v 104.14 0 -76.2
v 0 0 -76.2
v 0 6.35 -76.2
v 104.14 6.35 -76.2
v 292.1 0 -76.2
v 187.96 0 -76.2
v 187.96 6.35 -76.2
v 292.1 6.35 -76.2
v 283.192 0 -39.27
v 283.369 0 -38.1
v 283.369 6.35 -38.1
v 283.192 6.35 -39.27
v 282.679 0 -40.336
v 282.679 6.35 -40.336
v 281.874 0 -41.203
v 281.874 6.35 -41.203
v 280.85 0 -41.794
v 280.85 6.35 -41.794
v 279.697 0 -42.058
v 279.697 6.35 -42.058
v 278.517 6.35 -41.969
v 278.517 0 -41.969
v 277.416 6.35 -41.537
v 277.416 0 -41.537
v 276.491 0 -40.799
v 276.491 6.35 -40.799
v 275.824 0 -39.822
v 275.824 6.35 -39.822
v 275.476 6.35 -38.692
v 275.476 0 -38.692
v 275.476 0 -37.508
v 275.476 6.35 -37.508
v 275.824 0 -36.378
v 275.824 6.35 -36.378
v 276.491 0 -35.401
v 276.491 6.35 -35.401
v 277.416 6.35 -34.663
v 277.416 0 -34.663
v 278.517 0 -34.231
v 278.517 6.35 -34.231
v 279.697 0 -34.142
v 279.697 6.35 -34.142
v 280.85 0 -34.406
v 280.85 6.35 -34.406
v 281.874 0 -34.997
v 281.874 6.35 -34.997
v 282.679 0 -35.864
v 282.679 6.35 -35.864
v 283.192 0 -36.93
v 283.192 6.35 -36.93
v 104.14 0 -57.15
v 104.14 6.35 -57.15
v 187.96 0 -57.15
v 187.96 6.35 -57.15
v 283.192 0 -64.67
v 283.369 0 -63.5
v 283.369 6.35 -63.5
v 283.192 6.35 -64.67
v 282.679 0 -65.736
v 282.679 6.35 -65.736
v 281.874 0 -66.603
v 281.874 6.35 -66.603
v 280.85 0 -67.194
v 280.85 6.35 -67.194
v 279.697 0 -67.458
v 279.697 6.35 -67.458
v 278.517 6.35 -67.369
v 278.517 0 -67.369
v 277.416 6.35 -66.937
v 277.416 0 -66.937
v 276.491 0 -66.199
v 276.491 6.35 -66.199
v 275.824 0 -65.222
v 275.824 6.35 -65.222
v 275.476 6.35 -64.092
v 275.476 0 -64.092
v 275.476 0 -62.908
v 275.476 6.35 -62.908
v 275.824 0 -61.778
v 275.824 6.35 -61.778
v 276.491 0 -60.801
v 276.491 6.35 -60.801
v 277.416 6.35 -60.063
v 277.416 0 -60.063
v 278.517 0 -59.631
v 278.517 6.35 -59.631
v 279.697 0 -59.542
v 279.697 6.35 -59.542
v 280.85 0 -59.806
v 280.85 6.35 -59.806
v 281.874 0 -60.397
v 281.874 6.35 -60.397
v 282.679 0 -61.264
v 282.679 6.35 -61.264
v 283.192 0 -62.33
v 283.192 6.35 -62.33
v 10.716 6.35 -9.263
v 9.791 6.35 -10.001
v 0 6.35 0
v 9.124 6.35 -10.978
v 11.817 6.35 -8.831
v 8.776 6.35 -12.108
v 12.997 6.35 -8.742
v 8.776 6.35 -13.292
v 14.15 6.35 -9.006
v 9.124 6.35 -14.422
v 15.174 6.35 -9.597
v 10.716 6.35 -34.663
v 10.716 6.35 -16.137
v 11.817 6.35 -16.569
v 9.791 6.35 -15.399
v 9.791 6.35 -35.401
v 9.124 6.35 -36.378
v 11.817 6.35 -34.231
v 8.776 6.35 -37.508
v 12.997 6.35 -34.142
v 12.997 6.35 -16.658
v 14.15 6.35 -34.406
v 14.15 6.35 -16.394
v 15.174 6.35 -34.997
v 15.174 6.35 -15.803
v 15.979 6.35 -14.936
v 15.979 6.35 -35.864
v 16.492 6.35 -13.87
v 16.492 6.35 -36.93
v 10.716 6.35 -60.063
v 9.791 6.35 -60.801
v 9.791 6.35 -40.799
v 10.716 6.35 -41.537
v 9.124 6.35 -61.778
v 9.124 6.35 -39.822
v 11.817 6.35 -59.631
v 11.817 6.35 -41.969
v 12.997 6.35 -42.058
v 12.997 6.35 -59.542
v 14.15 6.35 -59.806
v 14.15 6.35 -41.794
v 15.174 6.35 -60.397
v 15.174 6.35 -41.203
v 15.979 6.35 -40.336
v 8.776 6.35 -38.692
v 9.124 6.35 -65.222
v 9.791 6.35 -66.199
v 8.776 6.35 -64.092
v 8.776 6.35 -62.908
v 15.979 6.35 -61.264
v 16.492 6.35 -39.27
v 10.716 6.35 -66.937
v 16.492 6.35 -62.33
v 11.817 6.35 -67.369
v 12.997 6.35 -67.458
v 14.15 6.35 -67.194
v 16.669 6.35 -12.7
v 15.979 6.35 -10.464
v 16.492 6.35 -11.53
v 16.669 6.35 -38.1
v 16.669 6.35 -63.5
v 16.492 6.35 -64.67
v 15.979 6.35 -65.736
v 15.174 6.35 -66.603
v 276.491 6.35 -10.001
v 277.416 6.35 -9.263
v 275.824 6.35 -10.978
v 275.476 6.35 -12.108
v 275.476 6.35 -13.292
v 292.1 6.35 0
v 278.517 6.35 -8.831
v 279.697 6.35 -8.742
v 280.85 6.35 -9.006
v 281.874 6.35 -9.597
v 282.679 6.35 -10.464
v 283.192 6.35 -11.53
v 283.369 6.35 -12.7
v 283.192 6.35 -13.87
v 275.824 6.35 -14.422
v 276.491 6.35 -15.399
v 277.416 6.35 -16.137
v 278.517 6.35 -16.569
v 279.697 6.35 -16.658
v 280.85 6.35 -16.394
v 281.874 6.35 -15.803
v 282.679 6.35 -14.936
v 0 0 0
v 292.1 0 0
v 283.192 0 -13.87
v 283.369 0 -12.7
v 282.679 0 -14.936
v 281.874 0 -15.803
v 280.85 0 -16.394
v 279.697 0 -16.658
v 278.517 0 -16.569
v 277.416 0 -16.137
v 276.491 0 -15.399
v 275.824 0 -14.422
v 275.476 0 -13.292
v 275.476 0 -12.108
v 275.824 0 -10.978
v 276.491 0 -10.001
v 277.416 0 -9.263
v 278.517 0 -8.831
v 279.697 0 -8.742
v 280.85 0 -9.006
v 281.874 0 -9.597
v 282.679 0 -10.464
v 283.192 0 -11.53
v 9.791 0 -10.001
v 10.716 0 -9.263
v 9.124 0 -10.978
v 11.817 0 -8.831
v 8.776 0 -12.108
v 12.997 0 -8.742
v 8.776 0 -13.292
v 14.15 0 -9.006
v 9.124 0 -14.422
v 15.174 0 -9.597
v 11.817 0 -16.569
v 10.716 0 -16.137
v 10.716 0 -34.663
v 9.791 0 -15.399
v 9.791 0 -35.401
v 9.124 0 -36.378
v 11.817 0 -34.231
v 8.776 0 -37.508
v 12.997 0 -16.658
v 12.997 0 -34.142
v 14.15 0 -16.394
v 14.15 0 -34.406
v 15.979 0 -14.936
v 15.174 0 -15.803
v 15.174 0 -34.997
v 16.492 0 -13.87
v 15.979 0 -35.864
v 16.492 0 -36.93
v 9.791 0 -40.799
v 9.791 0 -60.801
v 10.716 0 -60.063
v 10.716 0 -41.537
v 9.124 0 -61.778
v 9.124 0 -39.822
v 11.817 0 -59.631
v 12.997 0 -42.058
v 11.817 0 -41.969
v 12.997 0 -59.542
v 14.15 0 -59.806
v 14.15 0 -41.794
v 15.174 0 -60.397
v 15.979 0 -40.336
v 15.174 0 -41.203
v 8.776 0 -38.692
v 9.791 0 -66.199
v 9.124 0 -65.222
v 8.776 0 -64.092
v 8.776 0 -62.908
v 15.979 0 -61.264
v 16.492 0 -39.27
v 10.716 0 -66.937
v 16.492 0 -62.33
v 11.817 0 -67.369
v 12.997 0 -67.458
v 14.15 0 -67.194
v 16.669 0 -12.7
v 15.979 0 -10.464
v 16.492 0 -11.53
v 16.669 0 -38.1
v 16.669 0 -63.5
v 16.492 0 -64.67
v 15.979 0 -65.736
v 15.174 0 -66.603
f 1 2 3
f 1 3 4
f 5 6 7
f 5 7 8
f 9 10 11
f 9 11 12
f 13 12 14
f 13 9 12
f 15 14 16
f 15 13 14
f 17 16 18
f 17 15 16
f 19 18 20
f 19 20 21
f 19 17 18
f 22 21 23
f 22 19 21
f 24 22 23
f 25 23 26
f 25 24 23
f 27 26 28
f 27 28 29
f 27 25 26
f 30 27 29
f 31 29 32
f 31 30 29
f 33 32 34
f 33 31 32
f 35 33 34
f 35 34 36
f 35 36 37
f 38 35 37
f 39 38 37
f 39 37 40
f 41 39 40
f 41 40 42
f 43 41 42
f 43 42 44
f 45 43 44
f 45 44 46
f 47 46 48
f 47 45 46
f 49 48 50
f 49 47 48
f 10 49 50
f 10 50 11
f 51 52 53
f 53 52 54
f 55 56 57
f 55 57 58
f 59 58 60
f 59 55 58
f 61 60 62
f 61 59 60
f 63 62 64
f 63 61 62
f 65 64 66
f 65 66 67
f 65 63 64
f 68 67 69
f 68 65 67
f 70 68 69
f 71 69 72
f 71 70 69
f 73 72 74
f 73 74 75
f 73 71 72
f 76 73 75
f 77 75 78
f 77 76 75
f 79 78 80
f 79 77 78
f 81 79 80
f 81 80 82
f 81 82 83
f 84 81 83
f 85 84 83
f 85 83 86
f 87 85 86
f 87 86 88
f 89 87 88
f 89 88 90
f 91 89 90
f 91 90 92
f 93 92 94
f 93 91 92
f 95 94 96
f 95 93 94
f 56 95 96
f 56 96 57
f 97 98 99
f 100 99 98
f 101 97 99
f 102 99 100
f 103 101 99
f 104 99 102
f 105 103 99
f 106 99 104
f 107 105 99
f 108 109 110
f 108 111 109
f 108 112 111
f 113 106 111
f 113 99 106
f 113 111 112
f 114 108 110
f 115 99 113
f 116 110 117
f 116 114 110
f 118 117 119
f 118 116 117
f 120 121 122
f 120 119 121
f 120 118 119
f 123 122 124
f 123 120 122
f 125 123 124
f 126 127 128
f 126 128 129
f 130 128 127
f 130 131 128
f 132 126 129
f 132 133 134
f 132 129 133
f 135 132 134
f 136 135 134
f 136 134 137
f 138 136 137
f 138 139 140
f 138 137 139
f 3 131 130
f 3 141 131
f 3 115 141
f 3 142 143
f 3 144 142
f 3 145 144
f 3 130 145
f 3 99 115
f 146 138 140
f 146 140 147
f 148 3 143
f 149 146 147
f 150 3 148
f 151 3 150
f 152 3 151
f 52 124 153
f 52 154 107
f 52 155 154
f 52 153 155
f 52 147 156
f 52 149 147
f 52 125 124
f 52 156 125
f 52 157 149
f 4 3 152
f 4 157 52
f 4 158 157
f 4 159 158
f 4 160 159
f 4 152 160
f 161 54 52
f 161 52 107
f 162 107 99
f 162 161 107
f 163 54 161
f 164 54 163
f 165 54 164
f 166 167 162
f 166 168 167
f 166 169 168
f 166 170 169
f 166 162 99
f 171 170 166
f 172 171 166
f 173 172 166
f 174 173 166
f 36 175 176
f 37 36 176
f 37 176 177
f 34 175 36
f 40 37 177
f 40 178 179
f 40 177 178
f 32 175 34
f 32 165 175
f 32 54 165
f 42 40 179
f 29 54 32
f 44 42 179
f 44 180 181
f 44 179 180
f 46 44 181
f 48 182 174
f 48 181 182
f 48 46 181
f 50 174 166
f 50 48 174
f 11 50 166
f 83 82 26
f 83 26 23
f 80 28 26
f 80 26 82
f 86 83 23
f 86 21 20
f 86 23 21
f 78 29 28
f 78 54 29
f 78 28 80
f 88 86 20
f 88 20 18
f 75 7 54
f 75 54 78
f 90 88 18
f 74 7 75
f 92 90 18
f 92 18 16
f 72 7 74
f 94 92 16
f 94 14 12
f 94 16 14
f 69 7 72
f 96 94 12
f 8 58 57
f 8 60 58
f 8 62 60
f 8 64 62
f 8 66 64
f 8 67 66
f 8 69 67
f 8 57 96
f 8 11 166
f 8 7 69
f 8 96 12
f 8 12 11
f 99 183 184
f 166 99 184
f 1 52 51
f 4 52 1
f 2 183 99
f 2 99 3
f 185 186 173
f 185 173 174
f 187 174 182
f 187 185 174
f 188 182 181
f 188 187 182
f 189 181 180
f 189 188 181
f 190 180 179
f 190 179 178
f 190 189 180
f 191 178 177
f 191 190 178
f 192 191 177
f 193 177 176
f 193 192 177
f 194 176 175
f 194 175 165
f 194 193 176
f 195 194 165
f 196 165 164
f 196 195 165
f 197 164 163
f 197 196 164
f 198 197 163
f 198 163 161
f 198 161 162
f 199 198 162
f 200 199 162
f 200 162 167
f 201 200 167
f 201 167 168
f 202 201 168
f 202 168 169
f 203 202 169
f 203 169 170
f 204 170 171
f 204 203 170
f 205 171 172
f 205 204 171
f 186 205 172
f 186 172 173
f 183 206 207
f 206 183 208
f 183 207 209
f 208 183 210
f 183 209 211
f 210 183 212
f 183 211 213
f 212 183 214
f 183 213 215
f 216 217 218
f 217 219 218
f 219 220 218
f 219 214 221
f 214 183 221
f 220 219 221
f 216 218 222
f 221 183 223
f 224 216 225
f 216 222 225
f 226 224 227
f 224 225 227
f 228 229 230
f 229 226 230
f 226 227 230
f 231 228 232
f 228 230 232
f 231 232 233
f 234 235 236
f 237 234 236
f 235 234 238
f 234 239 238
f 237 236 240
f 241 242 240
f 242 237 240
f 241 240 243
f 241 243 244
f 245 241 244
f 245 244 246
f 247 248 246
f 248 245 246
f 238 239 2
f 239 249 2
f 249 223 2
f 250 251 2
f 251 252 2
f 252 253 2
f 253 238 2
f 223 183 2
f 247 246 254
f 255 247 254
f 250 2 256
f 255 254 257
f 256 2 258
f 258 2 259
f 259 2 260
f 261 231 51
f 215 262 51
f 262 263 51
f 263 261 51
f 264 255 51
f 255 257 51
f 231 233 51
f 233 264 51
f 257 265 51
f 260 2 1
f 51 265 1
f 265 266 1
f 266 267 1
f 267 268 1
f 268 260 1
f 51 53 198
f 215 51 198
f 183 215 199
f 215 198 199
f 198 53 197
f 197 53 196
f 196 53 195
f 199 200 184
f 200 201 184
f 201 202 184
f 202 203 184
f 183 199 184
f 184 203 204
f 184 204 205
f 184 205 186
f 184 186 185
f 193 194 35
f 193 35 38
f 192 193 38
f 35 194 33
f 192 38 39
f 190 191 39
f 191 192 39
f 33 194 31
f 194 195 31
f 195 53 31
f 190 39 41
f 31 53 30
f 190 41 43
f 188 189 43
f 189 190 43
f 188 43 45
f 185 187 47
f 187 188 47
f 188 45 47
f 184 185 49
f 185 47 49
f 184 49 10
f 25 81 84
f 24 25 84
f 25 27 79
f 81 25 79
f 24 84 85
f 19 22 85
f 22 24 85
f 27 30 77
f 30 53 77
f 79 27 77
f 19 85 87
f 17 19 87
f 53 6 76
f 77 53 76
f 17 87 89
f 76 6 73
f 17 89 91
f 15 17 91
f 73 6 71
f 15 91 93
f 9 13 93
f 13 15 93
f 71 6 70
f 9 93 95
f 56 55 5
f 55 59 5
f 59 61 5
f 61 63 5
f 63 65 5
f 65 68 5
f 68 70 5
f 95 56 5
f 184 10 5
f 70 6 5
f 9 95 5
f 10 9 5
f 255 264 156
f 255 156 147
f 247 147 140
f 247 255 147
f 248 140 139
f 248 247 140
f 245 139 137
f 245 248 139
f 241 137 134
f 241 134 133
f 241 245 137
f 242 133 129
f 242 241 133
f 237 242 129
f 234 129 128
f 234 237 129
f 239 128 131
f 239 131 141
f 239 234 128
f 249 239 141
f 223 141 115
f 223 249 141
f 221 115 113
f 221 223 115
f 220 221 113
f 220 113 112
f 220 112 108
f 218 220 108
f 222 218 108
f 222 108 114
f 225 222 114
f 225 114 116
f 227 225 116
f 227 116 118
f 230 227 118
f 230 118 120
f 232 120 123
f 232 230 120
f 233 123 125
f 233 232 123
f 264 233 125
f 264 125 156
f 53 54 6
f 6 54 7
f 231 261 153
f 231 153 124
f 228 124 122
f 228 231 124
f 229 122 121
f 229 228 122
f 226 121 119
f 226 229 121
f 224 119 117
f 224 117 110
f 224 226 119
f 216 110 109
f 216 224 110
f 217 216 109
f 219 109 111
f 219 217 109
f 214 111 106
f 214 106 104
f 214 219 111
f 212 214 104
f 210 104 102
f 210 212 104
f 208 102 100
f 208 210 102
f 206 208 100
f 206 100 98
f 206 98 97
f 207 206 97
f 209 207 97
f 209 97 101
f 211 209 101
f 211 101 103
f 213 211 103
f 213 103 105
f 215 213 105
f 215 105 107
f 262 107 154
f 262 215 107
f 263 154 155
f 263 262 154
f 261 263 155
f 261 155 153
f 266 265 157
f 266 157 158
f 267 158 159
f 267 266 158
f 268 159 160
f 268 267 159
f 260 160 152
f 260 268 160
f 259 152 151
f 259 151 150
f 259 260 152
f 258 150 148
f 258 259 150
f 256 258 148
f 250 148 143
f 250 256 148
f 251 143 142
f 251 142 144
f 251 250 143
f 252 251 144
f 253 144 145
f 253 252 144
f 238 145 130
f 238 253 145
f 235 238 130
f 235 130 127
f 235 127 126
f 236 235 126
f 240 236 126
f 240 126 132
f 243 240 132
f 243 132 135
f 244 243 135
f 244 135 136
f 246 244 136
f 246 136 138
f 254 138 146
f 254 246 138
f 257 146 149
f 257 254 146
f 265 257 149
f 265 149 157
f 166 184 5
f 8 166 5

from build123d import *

# Parameters (mm, degrees)
SKETCH1_W                     = 292.1
SKETCH1_H                     = 76.2
SKETCH1_R                     = 3.96875
BOSS_EXTRUDE1_DEPTH           = 6.35
MASTER_CYLINDER_OPENING_REACH = 8.35
SKETCH2_W                     = 83.82
SKETCH2_H                     = 19.05


with BuildPart() as part:
    # Sketch1 → Boss-Extrude1 (new body)
    with BuildSketch(Plane(origin=(0, 0, 0), x_dir=(1, 0, 0), z_dir=(0, 1, 0))):
        with Locations((146.05, 38.1)):
            Rectangle(SKETCH1_W, SKETCH1_H)
        with Locations((12.7, 63.5)):
            Circle(SKETCH1_R, mode=Mode.SUBTRACT)
        with Locations((12.7, 38.1)):
            Circle(SKETCH1_R, mode=Mode.SUBTRACT)
        with Locations((12.7, 12.7)):
            Circle(SKETCH1_R, mode=Mode.SUBTRACT)
        with Locations((279.4, 12.7)):
            Circle(SKETCH1_R, mode=Mode.SUBTRACT)
        with Locations((279.4, 38.1)):
            Circle(SKETCH1_R, mode=Mode.SUBTRACT)
        with Locations((279.4, 63.5)):
            Circle(SKETCH1_R, mode=Mode.SUBTRACT)
    extrude(amount=BOSS_EXTRUDE1_DEPTH)

    # Sketch2 → Master Cylinder Opening (cut, up to next)
    with BuildSketch(Plane(origin=(0, 6.35, 0), x_dir=(1, 0, 0), z_dir=(0, 1, 0)), mode=Mode.PRIVATE) as master_cylinder_opening_sk1:
        with Locations((146.05, 66.675)):
            Rectangle(SKETCH2_W, SKETCH2_H)
    master_cylinder_opening_tool1 = extrude(master_cylinder_opening_sk1.sketch, amount=-MASTER_CYLINDER_OPENING_REACH, mode=Mode.PRIVATE) & part.part
    add(master_cylinder_opening_tool1.solids().sort_by_distance((146.05, 6.35, -66.675))[0], mode=Mode.SUBTRACT)


solid = part.part
